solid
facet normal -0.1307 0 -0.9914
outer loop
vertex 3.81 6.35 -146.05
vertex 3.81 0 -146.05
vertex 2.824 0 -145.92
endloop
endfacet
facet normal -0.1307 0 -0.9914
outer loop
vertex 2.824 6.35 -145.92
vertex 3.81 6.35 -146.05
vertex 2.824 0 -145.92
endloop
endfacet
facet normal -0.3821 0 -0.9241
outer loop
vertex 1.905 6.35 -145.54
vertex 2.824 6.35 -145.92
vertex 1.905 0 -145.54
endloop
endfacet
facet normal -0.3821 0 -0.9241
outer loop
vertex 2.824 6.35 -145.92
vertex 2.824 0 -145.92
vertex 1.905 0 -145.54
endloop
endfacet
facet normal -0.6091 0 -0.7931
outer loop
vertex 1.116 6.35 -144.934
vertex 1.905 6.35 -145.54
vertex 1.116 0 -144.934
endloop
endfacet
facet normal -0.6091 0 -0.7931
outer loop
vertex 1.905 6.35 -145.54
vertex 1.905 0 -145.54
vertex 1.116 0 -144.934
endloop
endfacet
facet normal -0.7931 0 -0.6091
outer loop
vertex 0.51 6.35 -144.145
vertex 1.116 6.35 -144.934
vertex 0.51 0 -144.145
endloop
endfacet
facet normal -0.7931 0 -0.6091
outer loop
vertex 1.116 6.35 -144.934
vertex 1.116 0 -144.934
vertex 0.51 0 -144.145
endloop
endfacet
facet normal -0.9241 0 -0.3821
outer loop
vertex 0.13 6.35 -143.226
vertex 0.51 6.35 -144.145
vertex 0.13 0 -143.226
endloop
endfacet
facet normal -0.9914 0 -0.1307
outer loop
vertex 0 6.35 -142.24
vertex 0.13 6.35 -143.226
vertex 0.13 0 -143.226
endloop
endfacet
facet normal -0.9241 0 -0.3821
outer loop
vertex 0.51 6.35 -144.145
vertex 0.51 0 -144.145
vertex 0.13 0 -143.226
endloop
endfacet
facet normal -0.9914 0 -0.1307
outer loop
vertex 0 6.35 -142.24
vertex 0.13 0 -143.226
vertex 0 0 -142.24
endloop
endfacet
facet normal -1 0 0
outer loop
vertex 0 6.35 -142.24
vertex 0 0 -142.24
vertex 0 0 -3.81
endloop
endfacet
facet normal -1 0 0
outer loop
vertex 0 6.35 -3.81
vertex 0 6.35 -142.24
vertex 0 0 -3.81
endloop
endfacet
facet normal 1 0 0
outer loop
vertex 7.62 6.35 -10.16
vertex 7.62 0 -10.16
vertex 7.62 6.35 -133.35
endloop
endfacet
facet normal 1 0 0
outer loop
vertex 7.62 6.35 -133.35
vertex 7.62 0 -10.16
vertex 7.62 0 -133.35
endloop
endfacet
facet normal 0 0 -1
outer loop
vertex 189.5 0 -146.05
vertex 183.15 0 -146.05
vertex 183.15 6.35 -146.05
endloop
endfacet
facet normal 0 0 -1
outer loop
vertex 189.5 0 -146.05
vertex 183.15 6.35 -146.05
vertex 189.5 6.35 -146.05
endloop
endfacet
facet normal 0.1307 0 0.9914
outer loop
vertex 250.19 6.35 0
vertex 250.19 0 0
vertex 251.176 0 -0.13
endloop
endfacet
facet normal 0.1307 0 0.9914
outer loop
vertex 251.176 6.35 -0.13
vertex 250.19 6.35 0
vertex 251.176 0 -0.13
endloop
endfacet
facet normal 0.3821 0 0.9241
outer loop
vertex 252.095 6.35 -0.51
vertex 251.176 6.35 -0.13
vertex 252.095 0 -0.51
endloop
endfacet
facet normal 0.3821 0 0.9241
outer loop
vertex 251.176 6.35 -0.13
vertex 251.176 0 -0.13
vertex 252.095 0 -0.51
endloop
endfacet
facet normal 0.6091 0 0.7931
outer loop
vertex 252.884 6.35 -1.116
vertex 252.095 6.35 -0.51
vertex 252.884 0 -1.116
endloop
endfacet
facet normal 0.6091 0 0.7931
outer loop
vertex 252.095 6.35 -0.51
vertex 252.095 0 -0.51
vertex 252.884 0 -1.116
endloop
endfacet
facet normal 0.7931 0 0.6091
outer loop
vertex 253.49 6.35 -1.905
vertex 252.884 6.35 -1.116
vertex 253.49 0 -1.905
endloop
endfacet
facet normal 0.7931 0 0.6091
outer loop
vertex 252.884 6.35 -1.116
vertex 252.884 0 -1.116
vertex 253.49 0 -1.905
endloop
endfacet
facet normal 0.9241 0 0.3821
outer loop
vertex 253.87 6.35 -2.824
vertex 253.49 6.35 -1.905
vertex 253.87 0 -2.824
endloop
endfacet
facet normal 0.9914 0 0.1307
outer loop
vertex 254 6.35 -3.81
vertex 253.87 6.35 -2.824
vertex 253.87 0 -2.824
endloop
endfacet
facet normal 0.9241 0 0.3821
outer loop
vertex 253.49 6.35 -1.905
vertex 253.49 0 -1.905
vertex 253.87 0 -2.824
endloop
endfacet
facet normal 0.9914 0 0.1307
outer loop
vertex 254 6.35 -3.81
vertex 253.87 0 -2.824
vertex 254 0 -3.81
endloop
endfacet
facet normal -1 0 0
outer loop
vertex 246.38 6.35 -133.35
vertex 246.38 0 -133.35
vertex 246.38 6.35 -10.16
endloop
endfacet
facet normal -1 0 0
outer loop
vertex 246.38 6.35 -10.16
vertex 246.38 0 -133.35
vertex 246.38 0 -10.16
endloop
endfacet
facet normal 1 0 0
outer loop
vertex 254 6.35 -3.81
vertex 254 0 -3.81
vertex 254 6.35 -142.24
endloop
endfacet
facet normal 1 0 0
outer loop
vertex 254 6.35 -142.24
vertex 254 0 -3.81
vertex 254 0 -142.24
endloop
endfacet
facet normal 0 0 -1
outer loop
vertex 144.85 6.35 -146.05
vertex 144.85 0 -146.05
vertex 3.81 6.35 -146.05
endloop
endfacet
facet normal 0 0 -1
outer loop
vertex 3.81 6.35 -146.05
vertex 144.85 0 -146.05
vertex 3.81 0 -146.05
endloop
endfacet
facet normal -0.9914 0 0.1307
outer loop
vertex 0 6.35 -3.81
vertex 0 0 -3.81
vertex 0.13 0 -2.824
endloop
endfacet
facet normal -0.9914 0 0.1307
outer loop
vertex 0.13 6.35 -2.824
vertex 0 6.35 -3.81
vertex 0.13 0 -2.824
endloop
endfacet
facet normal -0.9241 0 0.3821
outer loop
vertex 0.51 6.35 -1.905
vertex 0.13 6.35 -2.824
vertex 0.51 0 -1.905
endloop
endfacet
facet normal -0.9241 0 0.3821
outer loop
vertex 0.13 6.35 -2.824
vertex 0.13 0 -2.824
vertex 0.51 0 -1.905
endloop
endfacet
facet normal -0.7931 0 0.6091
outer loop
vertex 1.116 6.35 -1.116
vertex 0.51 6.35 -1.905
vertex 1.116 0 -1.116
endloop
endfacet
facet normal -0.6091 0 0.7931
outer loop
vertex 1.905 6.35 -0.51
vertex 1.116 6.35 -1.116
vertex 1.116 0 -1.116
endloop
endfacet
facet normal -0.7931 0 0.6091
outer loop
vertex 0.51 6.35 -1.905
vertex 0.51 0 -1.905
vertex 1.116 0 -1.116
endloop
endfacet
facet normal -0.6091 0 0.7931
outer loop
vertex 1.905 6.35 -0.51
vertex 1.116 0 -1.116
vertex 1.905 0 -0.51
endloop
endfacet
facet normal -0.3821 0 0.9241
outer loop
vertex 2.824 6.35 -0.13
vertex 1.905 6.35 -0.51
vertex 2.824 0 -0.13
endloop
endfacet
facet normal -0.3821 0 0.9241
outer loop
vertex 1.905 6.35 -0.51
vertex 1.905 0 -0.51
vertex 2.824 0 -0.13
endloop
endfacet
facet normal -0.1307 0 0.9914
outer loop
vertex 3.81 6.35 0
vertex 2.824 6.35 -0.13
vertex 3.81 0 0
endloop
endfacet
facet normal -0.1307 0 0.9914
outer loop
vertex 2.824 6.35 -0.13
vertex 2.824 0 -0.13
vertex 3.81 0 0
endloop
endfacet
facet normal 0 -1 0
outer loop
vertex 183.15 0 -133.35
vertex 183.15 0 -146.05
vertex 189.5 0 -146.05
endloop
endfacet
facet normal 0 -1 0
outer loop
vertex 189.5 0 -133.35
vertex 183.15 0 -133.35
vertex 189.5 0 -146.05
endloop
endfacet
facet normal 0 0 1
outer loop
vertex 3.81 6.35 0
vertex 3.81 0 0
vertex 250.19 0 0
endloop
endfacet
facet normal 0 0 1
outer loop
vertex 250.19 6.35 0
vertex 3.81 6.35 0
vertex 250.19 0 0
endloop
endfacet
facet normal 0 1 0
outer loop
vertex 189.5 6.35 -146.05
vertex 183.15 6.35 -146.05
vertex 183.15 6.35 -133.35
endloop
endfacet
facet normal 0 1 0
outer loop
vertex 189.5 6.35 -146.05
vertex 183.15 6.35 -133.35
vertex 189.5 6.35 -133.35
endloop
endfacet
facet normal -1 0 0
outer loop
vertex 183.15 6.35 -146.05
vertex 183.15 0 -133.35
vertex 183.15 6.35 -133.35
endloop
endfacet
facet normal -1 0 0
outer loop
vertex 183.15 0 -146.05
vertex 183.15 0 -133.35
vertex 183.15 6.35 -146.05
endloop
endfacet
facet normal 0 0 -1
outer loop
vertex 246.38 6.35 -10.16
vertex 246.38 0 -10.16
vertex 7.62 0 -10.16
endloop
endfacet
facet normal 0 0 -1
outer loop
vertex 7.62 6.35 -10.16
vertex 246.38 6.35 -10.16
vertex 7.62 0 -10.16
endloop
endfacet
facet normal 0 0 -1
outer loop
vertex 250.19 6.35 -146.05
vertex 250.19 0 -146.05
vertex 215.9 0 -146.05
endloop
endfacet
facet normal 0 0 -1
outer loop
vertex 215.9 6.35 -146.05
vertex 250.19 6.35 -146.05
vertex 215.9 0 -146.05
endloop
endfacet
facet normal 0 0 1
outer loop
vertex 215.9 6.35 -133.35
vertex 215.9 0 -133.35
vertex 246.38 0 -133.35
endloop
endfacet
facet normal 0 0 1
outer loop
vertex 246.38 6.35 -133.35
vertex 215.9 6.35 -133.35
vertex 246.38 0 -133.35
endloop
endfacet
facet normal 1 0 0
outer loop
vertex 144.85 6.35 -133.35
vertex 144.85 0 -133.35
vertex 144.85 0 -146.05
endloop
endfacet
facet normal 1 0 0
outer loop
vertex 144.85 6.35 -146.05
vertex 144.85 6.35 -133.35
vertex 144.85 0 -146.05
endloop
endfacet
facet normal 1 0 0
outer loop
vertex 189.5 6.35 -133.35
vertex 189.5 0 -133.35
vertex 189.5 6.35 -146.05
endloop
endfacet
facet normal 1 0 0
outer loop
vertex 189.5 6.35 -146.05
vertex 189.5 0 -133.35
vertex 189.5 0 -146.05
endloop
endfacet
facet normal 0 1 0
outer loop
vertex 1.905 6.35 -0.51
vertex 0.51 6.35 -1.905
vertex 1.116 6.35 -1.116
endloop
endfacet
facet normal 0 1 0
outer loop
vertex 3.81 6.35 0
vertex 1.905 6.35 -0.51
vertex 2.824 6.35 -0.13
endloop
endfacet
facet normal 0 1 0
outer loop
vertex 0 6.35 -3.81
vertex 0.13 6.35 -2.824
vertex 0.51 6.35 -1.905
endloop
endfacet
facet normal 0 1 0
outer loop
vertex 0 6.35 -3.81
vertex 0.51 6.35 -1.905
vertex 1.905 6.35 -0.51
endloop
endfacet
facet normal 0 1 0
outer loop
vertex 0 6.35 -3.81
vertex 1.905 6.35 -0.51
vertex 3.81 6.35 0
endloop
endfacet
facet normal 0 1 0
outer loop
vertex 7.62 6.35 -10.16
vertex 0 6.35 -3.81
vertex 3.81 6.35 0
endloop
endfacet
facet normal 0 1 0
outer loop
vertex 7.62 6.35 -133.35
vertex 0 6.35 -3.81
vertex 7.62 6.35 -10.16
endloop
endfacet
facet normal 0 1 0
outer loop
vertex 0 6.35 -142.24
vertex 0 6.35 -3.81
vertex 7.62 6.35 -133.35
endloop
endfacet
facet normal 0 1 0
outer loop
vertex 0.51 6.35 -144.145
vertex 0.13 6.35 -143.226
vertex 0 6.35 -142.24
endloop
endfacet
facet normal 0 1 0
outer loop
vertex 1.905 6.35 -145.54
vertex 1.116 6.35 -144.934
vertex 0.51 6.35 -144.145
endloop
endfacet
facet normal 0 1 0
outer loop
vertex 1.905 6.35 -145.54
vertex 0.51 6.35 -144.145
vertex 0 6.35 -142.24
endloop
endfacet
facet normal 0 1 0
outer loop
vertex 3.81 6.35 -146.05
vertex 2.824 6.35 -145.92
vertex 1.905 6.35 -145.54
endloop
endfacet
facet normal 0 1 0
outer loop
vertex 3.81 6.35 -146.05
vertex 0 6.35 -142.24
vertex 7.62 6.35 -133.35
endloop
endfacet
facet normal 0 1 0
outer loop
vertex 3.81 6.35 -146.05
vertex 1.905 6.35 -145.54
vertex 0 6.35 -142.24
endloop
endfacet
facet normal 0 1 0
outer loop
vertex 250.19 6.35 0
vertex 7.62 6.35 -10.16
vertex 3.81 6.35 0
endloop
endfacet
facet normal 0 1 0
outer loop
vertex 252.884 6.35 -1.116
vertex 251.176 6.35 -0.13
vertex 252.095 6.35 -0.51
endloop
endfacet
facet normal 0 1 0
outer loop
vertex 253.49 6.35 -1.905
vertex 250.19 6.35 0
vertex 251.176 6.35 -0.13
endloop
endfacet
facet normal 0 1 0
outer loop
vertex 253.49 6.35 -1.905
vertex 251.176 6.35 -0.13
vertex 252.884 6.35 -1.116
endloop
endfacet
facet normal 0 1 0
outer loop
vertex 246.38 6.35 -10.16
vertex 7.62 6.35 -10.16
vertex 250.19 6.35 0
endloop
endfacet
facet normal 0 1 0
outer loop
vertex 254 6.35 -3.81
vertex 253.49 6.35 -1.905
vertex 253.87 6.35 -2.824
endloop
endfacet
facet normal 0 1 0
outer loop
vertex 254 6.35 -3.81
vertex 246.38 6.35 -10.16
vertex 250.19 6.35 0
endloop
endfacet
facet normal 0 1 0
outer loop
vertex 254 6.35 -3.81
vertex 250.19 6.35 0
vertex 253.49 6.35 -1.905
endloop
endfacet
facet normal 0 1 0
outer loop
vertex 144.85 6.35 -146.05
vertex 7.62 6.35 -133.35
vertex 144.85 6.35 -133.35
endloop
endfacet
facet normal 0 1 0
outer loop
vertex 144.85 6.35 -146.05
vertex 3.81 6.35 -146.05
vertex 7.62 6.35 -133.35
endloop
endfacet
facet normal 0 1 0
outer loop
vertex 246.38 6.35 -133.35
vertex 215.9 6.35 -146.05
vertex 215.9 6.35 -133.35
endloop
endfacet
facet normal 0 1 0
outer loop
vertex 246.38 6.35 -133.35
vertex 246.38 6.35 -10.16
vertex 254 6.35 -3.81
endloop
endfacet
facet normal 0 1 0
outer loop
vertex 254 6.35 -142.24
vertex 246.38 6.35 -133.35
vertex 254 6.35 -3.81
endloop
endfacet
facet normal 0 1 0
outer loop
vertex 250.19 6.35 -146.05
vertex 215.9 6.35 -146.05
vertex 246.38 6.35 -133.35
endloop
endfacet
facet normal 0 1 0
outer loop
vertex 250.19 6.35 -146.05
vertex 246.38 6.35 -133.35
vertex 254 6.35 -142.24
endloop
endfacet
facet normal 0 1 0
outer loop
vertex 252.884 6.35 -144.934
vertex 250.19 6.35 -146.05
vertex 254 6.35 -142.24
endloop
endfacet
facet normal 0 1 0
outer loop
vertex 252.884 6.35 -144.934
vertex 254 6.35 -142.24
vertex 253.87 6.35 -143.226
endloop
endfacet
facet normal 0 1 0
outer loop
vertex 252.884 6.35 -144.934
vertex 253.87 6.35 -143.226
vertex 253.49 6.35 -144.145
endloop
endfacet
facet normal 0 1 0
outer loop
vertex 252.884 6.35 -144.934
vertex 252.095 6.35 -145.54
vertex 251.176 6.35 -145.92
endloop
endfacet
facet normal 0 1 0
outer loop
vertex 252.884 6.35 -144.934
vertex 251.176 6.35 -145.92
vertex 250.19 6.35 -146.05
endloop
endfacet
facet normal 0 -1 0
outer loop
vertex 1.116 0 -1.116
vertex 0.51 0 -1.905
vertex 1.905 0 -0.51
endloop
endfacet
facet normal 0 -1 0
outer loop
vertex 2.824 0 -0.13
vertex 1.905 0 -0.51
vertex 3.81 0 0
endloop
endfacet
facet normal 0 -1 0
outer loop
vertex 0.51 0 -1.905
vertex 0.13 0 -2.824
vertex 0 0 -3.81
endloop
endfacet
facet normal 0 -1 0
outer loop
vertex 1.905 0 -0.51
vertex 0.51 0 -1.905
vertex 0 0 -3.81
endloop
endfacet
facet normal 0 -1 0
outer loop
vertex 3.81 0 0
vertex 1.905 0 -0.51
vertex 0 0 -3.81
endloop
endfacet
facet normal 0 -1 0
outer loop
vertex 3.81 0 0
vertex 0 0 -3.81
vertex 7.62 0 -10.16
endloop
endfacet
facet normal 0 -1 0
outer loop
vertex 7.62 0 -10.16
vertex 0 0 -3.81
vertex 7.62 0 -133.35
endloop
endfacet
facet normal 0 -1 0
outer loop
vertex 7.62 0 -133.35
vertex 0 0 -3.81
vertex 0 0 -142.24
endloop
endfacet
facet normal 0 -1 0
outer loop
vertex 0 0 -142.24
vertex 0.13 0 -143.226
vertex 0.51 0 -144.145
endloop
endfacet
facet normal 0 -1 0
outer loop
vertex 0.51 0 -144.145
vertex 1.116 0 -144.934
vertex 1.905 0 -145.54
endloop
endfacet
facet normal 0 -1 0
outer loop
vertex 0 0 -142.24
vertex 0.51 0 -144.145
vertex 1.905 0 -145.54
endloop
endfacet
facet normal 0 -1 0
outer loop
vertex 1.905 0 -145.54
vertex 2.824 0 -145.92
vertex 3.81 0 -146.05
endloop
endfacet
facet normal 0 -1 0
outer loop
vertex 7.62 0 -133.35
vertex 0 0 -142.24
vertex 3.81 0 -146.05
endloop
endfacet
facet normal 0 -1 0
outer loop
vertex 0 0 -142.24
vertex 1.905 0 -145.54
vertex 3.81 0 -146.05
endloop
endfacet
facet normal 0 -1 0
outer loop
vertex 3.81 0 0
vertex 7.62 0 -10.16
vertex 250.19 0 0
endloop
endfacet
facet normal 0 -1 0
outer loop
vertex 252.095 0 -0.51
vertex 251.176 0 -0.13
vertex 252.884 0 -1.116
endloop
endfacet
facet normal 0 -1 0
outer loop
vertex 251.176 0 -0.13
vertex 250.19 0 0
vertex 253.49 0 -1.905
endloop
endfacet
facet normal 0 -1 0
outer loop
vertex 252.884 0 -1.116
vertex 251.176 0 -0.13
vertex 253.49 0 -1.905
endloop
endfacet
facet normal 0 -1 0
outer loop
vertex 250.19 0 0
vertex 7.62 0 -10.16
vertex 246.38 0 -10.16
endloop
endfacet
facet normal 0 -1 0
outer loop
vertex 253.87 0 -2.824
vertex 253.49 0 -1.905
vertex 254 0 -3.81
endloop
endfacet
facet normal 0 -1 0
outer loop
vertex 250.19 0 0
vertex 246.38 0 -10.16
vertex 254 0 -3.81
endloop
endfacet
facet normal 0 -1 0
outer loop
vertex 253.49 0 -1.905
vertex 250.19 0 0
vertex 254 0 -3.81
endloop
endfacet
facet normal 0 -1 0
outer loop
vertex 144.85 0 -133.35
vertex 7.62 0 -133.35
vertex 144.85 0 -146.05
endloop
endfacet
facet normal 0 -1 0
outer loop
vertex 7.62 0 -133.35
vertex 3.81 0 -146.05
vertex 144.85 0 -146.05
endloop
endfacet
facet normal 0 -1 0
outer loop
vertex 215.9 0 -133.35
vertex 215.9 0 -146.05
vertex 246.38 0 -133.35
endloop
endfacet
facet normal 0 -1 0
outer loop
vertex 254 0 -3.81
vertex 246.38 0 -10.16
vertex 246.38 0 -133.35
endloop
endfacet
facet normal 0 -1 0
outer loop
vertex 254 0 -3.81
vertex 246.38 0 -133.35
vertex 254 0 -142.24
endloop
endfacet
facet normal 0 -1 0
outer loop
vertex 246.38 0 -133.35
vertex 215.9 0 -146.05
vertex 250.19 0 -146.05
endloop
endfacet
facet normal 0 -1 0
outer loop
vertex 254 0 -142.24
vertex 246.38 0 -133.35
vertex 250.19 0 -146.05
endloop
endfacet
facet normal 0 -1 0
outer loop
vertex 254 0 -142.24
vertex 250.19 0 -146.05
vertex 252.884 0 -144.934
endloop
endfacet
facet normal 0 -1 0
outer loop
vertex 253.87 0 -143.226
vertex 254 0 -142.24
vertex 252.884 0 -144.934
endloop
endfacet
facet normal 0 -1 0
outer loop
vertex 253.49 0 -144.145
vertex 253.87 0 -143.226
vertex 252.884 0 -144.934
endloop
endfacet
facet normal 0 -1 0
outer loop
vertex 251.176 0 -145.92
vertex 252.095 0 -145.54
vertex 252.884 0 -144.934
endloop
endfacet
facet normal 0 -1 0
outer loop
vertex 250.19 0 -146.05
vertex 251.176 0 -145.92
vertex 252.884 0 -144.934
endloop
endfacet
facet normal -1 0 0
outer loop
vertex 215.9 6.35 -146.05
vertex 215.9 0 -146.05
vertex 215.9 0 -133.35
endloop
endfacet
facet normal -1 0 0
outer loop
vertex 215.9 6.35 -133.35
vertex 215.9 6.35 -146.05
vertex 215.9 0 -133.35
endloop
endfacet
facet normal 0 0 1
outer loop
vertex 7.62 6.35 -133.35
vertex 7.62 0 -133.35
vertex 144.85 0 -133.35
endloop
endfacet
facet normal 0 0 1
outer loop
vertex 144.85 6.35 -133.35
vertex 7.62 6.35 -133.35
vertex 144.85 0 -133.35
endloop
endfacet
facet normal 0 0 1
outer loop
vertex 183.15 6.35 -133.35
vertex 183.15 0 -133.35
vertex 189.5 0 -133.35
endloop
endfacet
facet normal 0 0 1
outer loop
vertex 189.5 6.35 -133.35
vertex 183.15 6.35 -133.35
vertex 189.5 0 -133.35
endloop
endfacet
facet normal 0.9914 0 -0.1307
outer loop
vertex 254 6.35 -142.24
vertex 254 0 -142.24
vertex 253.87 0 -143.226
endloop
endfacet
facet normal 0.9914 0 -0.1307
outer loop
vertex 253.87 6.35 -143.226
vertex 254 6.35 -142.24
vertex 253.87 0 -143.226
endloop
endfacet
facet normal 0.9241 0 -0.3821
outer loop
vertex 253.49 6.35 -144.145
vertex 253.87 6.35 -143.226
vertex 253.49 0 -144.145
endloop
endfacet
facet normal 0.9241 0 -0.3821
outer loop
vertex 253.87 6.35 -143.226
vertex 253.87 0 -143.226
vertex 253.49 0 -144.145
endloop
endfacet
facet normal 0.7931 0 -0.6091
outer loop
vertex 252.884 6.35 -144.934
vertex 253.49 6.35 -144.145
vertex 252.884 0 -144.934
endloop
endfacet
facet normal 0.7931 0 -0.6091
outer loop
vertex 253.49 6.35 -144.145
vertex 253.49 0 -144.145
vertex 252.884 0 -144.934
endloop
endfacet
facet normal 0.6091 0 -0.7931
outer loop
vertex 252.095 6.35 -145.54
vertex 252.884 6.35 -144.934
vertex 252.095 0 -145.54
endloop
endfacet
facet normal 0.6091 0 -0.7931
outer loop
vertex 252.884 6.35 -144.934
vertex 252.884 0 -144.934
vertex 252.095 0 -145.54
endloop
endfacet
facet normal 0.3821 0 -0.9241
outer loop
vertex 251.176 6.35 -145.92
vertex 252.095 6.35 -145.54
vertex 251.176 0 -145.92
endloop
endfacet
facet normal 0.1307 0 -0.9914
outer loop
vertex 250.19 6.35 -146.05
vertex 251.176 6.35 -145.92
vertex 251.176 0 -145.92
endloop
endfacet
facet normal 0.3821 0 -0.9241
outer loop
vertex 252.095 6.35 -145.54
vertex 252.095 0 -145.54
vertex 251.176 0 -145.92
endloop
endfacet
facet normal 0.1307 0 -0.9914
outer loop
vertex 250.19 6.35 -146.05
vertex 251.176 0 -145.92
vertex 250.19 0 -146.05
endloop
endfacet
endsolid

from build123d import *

# Parameters (mm, degrees)
SKETCH1_W             = 6.35
SKETCH1_H             = 12.7
BOSS_EXTRUDE1_DEPTH   = 6.35
BOSS_EXTRUDE1_2_DEPTH = 6.35


with BuildPart() as part:
    # Sketch1 → Boss-Extrude1 (new body)
    with BuildSketch(Plane(origin=(0, 0, 0), x_dir=(1, 0, 0), z_dir=(0, 1, 0))):
        with Locations((186.325, 139.7)):
            Rectangle(SKETCH1_W, SKETCH1_H)
    extrude(amount=BOSS_EXTRUDE1_DEPTH)


with BuildPart() as body_2:
    # Sketch1 → Boss-Extrude1 2 (new body)
    with BuildSketch(Plane(origin=(0, 0, 0), x_dir=(1, 0, 0), z_dir=(0, 1, 0))):
        with BuildLine():
            Line((3.81, 0), (250.19, 0))
            ThreePointArc((250.19, 0), (252.884076836, 1.115923164), (254, 3.81))
            Line((254, 3.81), (254, 142.24))
            ThreePointArc((254, 142.24), (252.884076836, 144.934076836), (250.19, 146.05))
            Line((250.19, 146.05), (215.9, 146.05))
            Line((215.9, 146.05), (215.9, 133.35))
            Line((215.9, 133.35), (246.38, 133.35))
            Line((246.38, 133.35), (246.38, 10.16))
            Line((246.38, 10.16), (7.62, 10.16))
            Line((7.62, 10.16), (7.62, 133.35))
            Line((7.62, 133.35), (144.85, 133.35))
            Line((144.85, 133.35), (144.85, 146.05))
            Line((144.85, 146.05), (3.81, 146.05))
            ThreePointArc((3.81, 146.05), (1.115923164, 144.934076836), (0, 142.24))
            Line((0, 142.24), (0, 3.81))
            ThreePointArc((0, 3.81), (1.115923164, 1.115923164), (3.81, 0))
        make_face()
    extrude(amount=BOSS_EXTRUDE1_2_DEPTH)


solid = Compound([part.part, body_2.part])
